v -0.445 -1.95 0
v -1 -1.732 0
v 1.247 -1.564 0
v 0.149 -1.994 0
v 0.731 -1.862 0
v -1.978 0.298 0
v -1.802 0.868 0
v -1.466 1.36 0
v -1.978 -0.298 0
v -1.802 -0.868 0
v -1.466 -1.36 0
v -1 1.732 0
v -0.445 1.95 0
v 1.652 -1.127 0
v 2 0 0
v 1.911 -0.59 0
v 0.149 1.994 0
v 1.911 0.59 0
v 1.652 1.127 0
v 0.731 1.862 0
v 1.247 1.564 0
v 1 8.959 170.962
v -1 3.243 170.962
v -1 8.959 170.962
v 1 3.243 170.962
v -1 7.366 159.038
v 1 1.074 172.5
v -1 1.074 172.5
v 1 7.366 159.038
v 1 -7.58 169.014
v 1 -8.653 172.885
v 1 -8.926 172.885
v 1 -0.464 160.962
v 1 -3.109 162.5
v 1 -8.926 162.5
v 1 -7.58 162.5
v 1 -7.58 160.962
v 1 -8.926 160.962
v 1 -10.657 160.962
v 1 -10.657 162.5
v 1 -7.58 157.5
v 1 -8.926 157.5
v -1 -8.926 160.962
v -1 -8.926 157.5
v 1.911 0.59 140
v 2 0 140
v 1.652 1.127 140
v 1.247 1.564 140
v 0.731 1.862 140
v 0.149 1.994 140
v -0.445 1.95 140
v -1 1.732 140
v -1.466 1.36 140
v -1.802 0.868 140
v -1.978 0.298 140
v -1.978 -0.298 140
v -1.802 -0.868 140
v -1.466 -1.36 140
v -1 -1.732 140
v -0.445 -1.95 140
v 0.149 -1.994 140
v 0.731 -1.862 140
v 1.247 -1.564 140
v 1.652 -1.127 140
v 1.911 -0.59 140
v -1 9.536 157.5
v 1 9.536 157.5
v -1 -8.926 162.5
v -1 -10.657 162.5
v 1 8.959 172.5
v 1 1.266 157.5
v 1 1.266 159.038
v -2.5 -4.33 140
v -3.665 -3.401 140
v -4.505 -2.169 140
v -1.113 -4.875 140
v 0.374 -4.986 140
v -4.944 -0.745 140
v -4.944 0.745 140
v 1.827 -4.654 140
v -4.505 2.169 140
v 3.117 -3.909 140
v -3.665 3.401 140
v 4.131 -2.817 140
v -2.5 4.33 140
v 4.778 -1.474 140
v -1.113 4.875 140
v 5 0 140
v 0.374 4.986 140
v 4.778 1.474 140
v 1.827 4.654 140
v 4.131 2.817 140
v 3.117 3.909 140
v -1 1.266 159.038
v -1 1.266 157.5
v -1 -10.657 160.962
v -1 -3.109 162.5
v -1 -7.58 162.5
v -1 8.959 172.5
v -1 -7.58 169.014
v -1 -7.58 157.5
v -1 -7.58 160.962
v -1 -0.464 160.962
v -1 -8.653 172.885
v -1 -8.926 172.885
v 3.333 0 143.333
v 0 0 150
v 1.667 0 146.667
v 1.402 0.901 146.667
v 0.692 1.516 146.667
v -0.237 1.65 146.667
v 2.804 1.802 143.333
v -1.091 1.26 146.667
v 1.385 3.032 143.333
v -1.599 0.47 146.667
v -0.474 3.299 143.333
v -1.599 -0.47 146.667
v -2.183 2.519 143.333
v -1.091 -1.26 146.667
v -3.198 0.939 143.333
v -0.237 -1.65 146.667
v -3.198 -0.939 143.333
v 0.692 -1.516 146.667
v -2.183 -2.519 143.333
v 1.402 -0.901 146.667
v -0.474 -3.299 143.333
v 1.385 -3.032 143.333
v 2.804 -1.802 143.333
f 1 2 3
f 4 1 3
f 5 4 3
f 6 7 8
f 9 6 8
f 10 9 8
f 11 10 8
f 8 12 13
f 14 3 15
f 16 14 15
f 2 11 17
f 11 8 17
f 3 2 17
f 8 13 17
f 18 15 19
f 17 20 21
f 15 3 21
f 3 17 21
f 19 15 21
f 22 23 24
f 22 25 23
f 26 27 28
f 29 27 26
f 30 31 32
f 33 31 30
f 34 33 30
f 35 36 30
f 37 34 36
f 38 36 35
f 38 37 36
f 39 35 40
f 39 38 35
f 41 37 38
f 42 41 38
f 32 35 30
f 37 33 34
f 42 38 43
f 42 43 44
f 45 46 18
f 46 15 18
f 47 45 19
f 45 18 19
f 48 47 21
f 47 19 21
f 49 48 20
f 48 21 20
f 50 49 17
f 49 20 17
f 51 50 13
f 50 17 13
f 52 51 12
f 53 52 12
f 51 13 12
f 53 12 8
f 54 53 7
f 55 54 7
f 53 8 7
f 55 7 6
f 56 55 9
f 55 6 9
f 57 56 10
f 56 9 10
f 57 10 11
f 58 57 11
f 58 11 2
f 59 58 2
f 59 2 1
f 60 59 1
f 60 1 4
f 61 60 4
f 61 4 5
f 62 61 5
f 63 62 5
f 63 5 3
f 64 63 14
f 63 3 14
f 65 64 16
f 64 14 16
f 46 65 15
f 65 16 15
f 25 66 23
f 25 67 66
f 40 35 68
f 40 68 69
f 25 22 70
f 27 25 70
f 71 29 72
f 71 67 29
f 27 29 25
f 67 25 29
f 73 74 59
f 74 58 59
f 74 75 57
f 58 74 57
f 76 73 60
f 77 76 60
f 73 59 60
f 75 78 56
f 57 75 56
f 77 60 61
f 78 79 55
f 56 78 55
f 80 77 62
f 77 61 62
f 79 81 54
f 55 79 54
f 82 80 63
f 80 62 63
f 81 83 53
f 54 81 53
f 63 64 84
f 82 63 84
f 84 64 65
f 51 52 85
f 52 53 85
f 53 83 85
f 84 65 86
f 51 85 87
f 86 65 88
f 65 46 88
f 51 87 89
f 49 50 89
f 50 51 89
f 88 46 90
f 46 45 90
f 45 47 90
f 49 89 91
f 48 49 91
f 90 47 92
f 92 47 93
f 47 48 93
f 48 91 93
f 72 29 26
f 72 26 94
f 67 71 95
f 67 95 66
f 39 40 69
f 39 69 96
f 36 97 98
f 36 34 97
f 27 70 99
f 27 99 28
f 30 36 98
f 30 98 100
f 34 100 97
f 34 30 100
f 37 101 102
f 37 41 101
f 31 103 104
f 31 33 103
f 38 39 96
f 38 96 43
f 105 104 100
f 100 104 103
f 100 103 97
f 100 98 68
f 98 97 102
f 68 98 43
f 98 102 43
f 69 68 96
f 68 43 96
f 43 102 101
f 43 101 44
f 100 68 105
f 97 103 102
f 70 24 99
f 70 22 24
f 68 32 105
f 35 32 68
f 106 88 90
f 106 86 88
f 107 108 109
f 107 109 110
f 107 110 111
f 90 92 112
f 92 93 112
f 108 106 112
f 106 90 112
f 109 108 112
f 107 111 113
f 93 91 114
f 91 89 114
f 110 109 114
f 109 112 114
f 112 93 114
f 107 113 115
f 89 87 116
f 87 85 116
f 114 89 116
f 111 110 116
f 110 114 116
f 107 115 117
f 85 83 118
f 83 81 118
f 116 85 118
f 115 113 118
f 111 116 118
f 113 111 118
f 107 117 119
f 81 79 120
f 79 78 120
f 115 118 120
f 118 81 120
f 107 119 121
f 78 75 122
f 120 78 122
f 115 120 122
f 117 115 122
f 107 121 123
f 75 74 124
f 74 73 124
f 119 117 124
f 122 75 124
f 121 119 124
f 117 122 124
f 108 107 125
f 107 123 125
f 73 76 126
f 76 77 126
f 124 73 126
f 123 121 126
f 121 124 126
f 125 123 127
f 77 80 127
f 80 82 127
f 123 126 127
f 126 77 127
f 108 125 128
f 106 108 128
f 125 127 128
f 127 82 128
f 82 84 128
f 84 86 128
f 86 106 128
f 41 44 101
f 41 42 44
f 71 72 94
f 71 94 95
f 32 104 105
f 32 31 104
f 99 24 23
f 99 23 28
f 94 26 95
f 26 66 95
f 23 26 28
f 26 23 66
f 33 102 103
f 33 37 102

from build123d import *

# Parameters (mm, degrees)
BOSS_EXTRUDE1_DEPTH        = 1
BOSS_EXTRUDE1_DEPTH_BACK   = 1
BOSS_EXTRUDE1_2_DEPTH      = 1
BOSS_EXTRUDE1_2_DEPTH_BACK = 1


with BuildPart() as part:
    # Sketch2 → Revolve1 (revolve)
    with BuildSketch(Plane(origin=(0, 0, 0), x_dir=(1, 0, 0), z_dir=(0, 1, 0))):
        Polygon((0, -150), (5, -140), (2, -140), (2, 0), (0, 0), align=None)
    revolve(axis=Axis((0, 0, -41.949952025), (0, 0, 1)))


with BuildPart() as body_2:
    # Sketch3 → Boss-Extrude1 (new, two sides: drawn at the far end of the back side and taken through both)
    with BuildSketch(Plane(origin=(0, 0, 0), x_dir=(0, -1, 0), z_dir=(1, 0, 0)).offset(-BOSS_EXTRUDE1_DEPTH_BACK)):
        Polygon((-8.958586521, -170.961538462), (-8.958586521, -172.5), (-1.073971137, -172.5), (-7.366038444, -159.038461538), (-1.266278829, -159.038461538), (-1.266278829, -157.5), (-9.535509598, -157.5), (-3.243442291, -170.961538462), align=None)
    extrude(amount=BOSS_EXTRUDE1_DEPTH + BOSS_EXTRUDE1_DEPTH_BACK)


with BuildPart() as body_3:
    # Sketch3 → Boss-Extrude1 2 (new, two sides: drawn at the far end of the back side and taken through both)
    with BuildSketch(Plane(origin=(0, 0, 0), x_dir=(0, -1, 0), z_dir=(1, 0, 0)).offset(-BOSS_EXTRUDE1_2_DEPTH_BACK)):
        Polygon((8.652591363, -172.884615385), (8.926028863, -172.884615385), (8.926028863, -162.5), (10.656798094, -162.5), (10.656798094, -160.961538462), (8.926028863, -160.961538462), (8.926028863, -157.5), (7.579875017, -157.5), (7.579875017, -160.961538462), (0.464490402, -160.961538462), align=None)
        Polygon((7.579875017, -162.5), (7.579875017, -169.014423077), (3.108721171, -162.5), align=None, mode=Mode.SUBTRACT)
    extrude(amount=BOSS_EXTRUDE1_2_DEPTH + BOSS_EXTRUDE1_2_DEPTH_BACK)


solid = Compound([part.part, body_2.part, body_3.part])
